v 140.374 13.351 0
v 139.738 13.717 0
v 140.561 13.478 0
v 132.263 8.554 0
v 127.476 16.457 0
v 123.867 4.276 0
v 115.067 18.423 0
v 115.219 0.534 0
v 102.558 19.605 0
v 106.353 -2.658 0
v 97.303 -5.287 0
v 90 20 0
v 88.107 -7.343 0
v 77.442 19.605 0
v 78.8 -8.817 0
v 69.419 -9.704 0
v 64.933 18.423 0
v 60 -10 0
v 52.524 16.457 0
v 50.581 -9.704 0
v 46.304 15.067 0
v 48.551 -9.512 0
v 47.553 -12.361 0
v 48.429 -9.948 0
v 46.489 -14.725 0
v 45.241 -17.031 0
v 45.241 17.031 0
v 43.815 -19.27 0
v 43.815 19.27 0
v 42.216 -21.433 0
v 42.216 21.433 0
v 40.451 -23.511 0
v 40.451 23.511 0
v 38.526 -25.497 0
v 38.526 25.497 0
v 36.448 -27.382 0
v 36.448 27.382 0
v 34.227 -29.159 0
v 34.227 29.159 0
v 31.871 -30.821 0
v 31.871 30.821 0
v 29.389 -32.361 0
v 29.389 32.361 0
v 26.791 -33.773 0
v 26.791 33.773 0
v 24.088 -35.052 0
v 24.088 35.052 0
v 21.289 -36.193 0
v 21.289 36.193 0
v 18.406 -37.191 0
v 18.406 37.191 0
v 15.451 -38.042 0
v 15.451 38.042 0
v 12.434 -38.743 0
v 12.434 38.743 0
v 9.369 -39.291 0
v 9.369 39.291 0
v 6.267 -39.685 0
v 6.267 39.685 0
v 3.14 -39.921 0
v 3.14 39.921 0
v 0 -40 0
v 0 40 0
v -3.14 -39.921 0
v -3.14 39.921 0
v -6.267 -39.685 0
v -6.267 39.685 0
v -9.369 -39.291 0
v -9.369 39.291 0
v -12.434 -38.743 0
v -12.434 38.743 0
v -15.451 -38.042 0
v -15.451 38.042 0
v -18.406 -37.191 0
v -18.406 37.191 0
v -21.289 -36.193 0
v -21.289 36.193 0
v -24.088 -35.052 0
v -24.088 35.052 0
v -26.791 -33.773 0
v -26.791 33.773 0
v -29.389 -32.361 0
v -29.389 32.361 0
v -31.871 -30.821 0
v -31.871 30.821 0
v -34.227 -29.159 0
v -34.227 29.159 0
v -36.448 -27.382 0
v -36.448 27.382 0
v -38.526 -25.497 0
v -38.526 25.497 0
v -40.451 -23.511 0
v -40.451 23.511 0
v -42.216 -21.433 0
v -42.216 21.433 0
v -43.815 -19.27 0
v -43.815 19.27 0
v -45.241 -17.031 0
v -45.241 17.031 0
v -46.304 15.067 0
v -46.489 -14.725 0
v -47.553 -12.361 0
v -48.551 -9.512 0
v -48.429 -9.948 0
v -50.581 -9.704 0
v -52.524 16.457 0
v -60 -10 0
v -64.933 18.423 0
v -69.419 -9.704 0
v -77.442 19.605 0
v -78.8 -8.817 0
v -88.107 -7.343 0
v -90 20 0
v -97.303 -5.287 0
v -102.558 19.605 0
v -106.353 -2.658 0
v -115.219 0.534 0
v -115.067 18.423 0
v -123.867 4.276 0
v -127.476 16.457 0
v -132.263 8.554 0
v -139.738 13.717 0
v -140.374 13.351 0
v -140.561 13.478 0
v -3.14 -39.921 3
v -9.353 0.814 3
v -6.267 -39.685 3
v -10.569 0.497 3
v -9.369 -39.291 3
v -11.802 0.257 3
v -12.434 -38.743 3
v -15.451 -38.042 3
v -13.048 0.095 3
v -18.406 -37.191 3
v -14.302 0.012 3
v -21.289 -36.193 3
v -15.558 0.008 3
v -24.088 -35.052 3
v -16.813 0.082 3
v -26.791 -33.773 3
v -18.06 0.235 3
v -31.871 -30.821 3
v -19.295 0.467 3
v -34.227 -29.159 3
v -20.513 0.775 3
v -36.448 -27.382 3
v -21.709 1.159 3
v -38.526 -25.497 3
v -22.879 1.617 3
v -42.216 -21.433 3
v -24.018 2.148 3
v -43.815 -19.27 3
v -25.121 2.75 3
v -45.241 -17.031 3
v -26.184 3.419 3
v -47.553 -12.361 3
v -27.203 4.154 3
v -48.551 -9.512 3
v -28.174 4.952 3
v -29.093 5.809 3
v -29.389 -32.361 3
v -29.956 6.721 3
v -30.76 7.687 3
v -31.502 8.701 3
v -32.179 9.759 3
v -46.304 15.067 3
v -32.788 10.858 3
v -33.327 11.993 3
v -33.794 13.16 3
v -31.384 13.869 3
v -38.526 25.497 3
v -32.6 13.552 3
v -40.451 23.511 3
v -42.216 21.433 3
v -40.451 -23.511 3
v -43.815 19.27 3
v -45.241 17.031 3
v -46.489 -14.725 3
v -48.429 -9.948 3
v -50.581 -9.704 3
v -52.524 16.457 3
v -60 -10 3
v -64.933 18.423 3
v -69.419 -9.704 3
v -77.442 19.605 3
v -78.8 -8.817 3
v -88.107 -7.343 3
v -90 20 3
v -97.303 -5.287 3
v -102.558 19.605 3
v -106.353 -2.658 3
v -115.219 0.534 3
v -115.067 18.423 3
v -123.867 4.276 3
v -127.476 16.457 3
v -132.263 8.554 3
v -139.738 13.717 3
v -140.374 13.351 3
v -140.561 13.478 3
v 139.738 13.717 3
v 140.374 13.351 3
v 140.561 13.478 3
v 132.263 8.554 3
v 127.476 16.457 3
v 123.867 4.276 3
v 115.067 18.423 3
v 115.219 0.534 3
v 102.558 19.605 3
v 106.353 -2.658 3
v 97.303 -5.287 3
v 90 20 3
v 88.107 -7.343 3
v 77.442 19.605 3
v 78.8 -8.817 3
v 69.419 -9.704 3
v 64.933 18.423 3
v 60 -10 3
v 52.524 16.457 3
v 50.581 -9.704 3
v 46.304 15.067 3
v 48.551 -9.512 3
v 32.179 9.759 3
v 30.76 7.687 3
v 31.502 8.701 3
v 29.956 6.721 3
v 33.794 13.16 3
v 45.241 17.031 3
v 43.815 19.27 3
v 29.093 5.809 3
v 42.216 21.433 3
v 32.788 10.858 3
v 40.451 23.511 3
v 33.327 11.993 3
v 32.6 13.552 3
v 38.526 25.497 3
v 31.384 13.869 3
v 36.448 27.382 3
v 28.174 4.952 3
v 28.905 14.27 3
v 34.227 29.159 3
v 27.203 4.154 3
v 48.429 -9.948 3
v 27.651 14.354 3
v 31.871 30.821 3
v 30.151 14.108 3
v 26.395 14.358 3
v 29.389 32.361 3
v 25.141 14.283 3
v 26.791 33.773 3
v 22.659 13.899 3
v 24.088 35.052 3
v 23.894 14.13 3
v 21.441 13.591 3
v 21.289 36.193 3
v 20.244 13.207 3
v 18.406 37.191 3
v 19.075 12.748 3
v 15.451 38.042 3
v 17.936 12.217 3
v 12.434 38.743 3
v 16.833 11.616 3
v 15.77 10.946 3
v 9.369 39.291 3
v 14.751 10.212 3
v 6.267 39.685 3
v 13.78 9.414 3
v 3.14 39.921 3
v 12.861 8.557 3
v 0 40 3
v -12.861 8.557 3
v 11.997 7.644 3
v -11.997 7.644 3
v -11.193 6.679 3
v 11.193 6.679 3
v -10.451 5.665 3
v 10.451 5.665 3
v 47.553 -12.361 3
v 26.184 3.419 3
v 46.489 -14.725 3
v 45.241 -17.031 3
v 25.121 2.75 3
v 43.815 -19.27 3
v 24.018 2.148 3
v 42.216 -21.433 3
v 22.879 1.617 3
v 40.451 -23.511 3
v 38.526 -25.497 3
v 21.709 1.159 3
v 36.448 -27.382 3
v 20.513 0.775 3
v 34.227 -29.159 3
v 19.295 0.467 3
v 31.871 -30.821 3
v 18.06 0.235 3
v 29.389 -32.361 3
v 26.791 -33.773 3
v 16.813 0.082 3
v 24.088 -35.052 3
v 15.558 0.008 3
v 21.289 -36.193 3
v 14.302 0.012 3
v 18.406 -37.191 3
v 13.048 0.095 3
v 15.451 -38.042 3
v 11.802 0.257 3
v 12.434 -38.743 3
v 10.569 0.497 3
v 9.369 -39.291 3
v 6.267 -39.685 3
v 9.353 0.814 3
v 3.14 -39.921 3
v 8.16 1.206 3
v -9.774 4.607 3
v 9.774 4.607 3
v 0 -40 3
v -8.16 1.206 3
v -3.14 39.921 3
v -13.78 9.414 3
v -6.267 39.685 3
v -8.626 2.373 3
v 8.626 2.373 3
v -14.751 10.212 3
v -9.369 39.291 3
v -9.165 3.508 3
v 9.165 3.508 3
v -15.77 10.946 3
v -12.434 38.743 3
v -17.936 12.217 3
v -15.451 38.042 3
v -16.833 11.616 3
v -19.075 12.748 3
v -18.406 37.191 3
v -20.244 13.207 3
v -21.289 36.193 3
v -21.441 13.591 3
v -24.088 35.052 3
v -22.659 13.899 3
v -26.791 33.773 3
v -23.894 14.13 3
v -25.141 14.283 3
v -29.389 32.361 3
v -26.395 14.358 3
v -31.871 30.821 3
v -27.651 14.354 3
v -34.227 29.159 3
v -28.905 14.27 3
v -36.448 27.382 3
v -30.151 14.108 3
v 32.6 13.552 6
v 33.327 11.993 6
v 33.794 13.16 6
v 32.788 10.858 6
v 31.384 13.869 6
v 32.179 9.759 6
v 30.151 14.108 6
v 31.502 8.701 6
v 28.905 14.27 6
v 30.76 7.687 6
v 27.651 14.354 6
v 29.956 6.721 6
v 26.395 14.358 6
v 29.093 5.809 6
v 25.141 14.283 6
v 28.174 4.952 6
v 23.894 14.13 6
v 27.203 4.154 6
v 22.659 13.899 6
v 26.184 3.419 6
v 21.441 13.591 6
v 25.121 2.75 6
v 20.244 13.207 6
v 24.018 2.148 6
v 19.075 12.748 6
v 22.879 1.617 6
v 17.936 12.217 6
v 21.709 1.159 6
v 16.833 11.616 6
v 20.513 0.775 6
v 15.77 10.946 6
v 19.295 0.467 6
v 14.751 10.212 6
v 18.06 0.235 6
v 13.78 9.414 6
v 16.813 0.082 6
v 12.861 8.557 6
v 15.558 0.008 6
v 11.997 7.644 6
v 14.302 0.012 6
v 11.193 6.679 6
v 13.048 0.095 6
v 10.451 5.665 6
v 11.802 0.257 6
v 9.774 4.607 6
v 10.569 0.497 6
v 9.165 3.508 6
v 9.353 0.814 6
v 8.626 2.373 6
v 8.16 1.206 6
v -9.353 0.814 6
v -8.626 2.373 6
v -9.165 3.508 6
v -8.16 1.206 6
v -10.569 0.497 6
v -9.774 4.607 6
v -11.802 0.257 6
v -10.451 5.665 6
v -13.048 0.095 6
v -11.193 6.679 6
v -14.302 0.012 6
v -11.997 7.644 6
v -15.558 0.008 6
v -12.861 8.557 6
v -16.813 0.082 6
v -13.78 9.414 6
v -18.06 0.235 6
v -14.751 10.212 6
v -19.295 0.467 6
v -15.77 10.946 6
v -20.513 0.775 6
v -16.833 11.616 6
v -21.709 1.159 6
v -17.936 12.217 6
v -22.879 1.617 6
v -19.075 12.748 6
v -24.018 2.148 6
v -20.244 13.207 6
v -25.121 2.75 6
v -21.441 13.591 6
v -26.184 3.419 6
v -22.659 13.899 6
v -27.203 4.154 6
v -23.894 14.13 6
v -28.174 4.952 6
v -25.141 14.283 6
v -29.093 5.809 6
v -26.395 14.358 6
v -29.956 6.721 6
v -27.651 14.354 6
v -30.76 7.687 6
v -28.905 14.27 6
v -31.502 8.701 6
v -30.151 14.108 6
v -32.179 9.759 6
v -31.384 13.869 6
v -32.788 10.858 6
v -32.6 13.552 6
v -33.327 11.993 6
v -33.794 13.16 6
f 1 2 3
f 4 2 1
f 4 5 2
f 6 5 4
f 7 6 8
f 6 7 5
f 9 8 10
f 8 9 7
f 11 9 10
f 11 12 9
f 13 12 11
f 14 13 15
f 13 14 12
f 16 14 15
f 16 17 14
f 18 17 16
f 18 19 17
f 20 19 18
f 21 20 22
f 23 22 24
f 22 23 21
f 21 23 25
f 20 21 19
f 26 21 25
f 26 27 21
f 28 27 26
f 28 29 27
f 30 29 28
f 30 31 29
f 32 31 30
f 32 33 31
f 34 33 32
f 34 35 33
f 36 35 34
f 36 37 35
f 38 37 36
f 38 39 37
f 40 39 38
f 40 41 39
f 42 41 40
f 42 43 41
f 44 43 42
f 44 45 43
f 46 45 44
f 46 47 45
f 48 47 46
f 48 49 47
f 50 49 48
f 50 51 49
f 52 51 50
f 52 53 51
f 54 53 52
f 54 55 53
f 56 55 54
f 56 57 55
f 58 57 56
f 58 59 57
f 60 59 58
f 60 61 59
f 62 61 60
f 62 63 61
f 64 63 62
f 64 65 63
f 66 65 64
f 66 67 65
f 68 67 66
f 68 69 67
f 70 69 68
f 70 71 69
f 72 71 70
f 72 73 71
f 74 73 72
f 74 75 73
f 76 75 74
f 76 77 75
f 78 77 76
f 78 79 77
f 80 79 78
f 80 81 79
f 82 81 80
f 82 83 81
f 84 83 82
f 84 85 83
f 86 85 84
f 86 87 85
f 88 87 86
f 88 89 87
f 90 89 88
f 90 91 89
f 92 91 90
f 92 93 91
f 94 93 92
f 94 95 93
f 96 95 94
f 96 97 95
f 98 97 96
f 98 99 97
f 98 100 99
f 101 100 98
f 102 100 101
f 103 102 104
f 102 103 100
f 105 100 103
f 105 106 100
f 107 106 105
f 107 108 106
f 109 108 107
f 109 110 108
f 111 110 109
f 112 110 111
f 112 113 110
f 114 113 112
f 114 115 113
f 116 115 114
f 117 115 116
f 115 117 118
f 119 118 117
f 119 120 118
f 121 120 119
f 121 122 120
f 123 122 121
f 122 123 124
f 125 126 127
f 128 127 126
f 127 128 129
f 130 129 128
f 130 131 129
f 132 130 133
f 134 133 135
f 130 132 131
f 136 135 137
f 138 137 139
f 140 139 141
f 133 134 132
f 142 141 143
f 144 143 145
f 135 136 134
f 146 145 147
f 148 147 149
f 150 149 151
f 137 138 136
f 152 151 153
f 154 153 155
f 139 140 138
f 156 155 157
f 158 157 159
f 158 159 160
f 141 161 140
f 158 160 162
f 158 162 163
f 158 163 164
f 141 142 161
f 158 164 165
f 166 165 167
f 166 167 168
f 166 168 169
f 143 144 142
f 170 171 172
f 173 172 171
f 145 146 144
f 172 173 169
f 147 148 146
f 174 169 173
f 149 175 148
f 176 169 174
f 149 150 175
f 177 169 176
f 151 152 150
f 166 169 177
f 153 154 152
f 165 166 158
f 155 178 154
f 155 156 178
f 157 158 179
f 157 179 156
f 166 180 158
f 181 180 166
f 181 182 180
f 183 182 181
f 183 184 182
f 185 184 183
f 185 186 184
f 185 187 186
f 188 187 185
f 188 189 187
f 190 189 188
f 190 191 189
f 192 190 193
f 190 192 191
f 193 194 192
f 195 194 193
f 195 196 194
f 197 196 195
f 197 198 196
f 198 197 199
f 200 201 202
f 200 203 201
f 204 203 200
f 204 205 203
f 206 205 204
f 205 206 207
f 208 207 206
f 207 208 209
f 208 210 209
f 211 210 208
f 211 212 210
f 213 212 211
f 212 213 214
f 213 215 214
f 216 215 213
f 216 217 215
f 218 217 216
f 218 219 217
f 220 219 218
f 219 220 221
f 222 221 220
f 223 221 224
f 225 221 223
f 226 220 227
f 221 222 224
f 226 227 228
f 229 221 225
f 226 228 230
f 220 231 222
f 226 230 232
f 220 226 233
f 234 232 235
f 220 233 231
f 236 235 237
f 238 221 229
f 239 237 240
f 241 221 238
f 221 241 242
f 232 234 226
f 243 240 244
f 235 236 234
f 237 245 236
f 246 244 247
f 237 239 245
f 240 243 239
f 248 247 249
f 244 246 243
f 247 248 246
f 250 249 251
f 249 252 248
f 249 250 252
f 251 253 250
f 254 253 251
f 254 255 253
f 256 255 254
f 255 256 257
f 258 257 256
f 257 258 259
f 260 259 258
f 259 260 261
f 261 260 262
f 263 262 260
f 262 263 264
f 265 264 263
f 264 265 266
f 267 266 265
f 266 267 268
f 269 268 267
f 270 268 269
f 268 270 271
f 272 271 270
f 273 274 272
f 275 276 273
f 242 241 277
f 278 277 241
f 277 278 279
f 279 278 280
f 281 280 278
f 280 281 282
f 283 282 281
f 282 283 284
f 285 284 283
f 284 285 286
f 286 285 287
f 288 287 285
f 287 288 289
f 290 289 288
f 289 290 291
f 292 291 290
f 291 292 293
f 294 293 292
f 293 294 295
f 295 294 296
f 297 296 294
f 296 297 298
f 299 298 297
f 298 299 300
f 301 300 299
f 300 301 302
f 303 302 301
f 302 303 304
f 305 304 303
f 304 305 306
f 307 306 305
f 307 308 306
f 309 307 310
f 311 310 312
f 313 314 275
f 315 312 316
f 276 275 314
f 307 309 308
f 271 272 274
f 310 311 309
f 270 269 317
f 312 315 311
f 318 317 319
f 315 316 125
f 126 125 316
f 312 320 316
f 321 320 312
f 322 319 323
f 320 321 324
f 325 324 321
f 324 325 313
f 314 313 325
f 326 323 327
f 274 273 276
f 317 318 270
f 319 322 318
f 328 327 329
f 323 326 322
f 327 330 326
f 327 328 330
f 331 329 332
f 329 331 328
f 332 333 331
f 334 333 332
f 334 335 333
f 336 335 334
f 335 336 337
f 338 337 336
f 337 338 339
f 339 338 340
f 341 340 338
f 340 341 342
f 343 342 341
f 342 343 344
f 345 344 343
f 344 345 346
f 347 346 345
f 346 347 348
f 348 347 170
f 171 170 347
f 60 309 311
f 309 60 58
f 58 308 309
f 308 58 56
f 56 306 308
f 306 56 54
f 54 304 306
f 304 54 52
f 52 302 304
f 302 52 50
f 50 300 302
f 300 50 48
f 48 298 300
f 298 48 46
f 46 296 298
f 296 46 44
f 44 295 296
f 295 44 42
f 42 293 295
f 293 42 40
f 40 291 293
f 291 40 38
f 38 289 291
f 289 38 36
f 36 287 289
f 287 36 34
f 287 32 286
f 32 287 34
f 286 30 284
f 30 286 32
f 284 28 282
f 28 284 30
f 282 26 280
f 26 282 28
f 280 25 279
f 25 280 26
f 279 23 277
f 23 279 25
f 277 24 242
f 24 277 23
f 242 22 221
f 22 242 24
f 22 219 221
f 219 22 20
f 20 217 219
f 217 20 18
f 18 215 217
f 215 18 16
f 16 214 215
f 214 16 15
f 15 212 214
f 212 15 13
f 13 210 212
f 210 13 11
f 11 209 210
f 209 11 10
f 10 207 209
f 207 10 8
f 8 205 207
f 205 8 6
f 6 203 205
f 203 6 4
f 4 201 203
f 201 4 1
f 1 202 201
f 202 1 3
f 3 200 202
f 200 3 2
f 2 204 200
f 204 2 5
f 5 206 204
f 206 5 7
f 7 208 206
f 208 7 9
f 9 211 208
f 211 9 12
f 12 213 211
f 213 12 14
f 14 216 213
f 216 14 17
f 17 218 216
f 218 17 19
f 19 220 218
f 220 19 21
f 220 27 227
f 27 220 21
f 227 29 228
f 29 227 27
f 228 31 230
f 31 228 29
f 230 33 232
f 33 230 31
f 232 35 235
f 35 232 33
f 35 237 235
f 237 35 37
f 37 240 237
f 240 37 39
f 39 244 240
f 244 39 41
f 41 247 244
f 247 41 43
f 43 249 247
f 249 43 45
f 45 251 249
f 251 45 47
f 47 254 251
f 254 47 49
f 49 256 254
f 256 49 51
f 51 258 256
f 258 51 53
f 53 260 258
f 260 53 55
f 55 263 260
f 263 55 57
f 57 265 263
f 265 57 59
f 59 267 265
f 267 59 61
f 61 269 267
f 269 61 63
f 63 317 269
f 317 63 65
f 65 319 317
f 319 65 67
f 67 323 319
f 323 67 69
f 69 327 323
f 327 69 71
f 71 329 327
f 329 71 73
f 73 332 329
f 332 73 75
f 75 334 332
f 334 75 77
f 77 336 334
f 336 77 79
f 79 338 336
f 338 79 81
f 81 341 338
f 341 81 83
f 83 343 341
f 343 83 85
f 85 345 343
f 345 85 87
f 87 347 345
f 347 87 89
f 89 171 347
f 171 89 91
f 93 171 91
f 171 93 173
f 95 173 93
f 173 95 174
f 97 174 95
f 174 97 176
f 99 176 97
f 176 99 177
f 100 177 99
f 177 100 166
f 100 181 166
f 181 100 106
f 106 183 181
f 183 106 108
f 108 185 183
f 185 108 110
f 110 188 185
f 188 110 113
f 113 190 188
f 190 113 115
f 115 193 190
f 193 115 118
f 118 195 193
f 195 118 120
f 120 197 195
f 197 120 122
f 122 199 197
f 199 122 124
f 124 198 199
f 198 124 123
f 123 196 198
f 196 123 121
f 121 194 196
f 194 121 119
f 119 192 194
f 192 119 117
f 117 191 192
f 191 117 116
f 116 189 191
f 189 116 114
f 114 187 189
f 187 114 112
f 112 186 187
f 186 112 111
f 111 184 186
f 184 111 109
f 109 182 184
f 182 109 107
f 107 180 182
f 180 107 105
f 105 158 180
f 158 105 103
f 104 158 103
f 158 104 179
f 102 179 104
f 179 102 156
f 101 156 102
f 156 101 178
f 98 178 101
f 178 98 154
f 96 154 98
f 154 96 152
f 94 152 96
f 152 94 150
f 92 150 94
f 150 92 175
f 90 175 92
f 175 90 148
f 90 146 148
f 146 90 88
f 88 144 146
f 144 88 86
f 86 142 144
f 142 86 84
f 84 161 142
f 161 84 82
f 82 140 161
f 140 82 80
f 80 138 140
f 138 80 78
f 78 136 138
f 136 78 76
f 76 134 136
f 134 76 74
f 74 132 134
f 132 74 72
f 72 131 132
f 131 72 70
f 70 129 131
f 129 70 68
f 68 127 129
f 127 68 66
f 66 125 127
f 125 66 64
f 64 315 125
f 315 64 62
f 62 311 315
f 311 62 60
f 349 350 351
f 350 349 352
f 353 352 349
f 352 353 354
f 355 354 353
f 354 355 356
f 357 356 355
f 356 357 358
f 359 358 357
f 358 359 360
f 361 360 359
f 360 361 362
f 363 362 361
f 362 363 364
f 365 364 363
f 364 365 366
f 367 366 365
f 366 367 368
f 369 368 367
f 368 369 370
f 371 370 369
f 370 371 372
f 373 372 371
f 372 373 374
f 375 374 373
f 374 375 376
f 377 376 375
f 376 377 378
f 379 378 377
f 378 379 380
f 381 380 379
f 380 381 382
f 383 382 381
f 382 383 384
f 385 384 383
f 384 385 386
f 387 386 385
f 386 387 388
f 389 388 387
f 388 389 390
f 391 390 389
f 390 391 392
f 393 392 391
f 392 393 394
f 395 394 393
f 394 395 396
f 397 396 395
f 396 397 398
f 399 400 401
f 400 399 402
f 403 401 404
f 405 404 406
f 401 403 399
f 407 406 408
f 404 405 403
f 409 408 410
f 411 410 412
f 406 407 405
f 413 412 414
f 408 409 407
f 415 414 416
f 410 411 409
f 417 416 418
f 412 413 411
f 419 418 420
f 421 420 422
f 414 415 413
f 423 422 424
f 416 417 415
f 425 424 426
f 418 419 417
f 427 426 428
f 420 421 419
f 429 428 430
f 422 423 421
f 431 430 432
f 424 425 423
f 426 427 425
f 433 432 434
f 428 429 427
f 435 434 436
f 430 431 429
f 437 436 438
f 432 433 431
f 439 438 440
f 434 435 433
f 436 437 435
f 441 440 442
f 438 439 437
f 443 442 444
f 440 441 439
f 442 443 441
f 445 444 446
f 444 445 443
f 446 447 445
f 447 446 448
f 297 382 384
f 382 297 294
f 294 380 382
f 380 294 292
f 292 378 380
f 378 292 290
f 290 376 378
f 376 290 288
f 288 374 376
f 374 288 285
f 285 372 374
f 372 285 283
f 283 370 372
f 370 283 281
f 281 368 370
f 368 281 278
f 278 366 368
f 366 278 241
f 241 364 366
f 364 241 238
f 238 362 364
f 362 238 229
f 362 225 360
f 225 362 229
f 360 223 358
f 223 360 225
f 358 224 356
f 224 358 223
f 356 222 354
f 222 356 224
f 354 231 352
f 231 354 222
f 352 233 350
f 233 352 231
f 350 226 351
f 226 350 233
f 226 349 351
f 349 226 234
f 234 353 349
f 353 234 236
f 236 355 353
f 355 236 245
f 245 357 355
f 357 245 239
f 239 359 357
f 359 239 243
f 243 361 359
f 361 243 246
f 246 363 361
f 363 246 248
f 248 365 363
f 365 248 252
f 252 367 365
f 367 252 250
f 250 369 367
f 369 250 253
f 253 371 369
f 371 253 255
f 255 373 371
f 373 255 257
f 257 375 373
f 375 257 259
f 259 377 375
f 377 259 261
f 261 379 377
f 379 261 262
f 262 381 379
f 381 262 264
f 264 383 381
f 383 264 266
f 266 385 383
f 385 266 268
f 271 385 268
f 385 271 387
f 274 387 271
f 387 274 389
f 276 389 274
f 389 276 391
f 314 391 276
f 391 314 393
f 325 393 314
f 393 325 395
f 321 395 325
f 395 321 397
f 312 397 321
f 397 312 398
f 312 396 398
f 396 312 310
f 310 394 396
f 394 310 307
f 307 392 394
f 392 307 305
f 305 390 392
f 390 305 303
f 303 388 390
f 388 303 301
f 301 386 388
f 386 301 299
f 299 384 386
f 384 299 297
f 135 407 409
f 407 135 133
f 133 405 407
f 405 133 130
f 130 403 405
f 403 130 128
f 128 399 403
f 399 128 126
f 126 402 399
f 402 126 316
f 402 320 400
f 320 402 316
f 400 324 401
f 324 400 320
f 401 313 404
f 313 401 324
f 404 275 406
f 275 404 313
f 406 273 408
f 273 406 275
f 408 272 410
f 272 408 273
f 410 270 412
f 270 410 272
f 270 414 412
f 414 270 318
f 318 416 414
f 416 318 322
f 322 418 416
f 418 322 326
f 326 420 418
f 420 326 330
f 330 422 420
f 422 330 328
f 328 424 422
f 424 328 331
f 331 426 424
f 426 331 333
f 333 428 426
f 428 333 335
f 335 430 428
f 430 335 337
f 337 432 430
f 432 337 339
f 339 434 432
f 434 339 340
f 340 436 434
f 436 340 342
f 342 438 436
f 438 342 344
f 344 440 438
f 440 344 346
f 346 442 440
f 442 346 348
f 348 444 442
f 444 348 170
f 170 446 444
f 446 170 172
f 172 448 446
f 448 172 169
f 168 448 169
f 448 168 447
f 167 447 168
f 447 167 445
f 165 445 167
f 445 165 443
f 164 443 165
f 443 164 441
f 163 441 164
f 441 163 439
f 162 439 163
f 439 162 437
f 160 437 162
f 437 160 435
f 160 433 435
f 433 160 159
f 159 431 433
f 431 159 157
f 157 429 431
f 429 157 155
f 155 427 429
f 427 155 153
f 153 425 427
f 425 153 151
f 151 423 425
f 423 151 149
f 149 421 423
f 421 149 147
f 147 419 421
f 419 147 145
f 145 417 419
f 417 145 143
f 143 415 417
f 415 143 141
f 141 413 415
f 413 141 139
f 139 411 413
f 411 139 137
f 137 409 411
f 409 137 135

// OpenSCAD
// Height of layer 1 (white)
layer1Height = 3;
// Height of layer 2 (orange)
layer2Height = 3;
// Height of layer 3 (black)
layer3Height = 3;

/* [Animation] */
// rotating animation
animation_rotation = false;
// resolution
$fn = 100;

/* [Hidden] */
is_animated = animation_rotation;
$vpt = is_animated?[0, 0, 0]:[];
$vpr = is_animated?[60, 0, animation_rotation?(365 * $t):45]:[]; // animation rotate around the object
$vpd = is_animated?500:[];

fox();

module fox() {
    color("PaleGreen")
        linear_extrude(layer1Height)
            layer1();

    color("DarkSlateGray")
        translate([0, 0, layer1Height])
            linear_extrude(layer2Height)
                layer2();
}

module layer1() {
    scale([1,0.8,1])
    circle(r = 50);
    mmirror([1, 0, 0])
    hearIn();
}

module layer2() {
    mmirror([1, 0, 0])
    eye();
}

module hearIn() {
    intersection() {
        translate([90, -180, 0])
            circle(r = 200);
        translate([60, 140, 0])
            circle(r = 150);
    }
}

module eye() {
    translate([15, 20, 0])
        rotate([0, 0, -20])
            intersection() {
                circle(r = 20);
                translate([20, -20, 0])
                    circle(r = 20);
            }
}

/*
same as mirror but duplicate children
*/
module mmirror(mat) {
    children();
    mirror(mat)
        children();
}
